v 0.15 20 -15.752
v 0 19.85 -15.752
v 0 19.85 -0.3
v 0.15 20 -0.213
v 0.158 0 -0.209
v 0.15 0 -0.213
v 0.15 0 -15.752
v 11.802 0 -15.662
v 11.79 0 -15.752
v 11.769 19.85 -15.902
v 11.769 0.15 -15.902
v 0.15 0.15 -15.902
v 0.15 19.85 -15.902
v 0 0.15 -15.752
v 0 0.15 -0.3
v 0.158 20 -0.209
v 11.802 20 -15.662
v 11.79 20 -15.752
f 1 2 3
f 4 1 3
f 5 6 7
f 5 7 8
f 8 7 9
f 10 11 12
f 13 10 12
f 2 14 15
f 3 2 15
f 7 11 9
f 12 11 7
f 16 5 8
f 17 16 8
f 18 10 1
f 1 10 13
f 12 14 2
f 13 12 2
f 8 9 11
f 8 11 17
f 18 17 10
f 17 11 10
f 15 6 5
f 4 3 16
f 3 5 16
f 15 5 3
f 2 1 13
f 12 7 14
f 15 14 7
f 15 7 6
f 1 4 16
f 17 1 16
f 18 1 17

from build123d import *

# Parameters (mm, degrees)
EXTRUDE_1_DEPTH = 20
CHAMFER_1_SIZE  = 0.3
CHAMFER_1_SIZE2 = 0.261758731
CHAMFER_2_SIZE2 = 0.214216777
CHAMFER_2_SIZE  = 0.3
CHAMFER_3_SIZE  = 0.15


with BuildPart() as part:
    # Эскиз1 → Вытянуть1 (new body)
    with BuildSketch(Plane(origin=(0, 0, 0), x_dir=(1, 0, 0), z_dir=(0, 1, 0))):
        Polygon((0, 0), (11.982938249, 15.901896151), (0, 15.901896151), align=None)
    extrude(amount=EXTRUDE_1_DEPTH)

    # Фаска1
    chamfer_1_edges = [part.edges().sort_by_distance(p)[0] for p in [
        (0, 10, 0),
    ]]
    chamfer_1_side = [part.faces().sort_by_distance(p)[0] for p in [
        (0, 10, -7.950948075),
    ]]
    chamfer(chamfer_1_edges, length=CHAMFER_1_SIZE, length2=CHAMFER_1_SIZE2, reference=chamfer_1_side[0])

    # Фаска2
    chamfer_2_edges = [part.edges().sort_by_distance(p)[0] for p in [
        (11.982938249, 10, -15.901896151),
    ]]
    chamfer(chamfer_2_edges, length=CHAMFER_2_SIZE, length2=CHAMFER_2_SIZE2)

    # Фаска3
    chamfer_3_edges = [part.edges().sort_by_distance(p)[0] for p in [
        (5.884360736, 0, -15.901896151),
        (5.884360736, 20, -15.901896151),
        (0, 20, -8.100948075),
        (0, 0, -8.100948075),
        (0, 10, -15.901896151),
    ]]
    chamfer(chamfer_3_edges, length=CHAMFER_3_SIZE)


solid = part.part
